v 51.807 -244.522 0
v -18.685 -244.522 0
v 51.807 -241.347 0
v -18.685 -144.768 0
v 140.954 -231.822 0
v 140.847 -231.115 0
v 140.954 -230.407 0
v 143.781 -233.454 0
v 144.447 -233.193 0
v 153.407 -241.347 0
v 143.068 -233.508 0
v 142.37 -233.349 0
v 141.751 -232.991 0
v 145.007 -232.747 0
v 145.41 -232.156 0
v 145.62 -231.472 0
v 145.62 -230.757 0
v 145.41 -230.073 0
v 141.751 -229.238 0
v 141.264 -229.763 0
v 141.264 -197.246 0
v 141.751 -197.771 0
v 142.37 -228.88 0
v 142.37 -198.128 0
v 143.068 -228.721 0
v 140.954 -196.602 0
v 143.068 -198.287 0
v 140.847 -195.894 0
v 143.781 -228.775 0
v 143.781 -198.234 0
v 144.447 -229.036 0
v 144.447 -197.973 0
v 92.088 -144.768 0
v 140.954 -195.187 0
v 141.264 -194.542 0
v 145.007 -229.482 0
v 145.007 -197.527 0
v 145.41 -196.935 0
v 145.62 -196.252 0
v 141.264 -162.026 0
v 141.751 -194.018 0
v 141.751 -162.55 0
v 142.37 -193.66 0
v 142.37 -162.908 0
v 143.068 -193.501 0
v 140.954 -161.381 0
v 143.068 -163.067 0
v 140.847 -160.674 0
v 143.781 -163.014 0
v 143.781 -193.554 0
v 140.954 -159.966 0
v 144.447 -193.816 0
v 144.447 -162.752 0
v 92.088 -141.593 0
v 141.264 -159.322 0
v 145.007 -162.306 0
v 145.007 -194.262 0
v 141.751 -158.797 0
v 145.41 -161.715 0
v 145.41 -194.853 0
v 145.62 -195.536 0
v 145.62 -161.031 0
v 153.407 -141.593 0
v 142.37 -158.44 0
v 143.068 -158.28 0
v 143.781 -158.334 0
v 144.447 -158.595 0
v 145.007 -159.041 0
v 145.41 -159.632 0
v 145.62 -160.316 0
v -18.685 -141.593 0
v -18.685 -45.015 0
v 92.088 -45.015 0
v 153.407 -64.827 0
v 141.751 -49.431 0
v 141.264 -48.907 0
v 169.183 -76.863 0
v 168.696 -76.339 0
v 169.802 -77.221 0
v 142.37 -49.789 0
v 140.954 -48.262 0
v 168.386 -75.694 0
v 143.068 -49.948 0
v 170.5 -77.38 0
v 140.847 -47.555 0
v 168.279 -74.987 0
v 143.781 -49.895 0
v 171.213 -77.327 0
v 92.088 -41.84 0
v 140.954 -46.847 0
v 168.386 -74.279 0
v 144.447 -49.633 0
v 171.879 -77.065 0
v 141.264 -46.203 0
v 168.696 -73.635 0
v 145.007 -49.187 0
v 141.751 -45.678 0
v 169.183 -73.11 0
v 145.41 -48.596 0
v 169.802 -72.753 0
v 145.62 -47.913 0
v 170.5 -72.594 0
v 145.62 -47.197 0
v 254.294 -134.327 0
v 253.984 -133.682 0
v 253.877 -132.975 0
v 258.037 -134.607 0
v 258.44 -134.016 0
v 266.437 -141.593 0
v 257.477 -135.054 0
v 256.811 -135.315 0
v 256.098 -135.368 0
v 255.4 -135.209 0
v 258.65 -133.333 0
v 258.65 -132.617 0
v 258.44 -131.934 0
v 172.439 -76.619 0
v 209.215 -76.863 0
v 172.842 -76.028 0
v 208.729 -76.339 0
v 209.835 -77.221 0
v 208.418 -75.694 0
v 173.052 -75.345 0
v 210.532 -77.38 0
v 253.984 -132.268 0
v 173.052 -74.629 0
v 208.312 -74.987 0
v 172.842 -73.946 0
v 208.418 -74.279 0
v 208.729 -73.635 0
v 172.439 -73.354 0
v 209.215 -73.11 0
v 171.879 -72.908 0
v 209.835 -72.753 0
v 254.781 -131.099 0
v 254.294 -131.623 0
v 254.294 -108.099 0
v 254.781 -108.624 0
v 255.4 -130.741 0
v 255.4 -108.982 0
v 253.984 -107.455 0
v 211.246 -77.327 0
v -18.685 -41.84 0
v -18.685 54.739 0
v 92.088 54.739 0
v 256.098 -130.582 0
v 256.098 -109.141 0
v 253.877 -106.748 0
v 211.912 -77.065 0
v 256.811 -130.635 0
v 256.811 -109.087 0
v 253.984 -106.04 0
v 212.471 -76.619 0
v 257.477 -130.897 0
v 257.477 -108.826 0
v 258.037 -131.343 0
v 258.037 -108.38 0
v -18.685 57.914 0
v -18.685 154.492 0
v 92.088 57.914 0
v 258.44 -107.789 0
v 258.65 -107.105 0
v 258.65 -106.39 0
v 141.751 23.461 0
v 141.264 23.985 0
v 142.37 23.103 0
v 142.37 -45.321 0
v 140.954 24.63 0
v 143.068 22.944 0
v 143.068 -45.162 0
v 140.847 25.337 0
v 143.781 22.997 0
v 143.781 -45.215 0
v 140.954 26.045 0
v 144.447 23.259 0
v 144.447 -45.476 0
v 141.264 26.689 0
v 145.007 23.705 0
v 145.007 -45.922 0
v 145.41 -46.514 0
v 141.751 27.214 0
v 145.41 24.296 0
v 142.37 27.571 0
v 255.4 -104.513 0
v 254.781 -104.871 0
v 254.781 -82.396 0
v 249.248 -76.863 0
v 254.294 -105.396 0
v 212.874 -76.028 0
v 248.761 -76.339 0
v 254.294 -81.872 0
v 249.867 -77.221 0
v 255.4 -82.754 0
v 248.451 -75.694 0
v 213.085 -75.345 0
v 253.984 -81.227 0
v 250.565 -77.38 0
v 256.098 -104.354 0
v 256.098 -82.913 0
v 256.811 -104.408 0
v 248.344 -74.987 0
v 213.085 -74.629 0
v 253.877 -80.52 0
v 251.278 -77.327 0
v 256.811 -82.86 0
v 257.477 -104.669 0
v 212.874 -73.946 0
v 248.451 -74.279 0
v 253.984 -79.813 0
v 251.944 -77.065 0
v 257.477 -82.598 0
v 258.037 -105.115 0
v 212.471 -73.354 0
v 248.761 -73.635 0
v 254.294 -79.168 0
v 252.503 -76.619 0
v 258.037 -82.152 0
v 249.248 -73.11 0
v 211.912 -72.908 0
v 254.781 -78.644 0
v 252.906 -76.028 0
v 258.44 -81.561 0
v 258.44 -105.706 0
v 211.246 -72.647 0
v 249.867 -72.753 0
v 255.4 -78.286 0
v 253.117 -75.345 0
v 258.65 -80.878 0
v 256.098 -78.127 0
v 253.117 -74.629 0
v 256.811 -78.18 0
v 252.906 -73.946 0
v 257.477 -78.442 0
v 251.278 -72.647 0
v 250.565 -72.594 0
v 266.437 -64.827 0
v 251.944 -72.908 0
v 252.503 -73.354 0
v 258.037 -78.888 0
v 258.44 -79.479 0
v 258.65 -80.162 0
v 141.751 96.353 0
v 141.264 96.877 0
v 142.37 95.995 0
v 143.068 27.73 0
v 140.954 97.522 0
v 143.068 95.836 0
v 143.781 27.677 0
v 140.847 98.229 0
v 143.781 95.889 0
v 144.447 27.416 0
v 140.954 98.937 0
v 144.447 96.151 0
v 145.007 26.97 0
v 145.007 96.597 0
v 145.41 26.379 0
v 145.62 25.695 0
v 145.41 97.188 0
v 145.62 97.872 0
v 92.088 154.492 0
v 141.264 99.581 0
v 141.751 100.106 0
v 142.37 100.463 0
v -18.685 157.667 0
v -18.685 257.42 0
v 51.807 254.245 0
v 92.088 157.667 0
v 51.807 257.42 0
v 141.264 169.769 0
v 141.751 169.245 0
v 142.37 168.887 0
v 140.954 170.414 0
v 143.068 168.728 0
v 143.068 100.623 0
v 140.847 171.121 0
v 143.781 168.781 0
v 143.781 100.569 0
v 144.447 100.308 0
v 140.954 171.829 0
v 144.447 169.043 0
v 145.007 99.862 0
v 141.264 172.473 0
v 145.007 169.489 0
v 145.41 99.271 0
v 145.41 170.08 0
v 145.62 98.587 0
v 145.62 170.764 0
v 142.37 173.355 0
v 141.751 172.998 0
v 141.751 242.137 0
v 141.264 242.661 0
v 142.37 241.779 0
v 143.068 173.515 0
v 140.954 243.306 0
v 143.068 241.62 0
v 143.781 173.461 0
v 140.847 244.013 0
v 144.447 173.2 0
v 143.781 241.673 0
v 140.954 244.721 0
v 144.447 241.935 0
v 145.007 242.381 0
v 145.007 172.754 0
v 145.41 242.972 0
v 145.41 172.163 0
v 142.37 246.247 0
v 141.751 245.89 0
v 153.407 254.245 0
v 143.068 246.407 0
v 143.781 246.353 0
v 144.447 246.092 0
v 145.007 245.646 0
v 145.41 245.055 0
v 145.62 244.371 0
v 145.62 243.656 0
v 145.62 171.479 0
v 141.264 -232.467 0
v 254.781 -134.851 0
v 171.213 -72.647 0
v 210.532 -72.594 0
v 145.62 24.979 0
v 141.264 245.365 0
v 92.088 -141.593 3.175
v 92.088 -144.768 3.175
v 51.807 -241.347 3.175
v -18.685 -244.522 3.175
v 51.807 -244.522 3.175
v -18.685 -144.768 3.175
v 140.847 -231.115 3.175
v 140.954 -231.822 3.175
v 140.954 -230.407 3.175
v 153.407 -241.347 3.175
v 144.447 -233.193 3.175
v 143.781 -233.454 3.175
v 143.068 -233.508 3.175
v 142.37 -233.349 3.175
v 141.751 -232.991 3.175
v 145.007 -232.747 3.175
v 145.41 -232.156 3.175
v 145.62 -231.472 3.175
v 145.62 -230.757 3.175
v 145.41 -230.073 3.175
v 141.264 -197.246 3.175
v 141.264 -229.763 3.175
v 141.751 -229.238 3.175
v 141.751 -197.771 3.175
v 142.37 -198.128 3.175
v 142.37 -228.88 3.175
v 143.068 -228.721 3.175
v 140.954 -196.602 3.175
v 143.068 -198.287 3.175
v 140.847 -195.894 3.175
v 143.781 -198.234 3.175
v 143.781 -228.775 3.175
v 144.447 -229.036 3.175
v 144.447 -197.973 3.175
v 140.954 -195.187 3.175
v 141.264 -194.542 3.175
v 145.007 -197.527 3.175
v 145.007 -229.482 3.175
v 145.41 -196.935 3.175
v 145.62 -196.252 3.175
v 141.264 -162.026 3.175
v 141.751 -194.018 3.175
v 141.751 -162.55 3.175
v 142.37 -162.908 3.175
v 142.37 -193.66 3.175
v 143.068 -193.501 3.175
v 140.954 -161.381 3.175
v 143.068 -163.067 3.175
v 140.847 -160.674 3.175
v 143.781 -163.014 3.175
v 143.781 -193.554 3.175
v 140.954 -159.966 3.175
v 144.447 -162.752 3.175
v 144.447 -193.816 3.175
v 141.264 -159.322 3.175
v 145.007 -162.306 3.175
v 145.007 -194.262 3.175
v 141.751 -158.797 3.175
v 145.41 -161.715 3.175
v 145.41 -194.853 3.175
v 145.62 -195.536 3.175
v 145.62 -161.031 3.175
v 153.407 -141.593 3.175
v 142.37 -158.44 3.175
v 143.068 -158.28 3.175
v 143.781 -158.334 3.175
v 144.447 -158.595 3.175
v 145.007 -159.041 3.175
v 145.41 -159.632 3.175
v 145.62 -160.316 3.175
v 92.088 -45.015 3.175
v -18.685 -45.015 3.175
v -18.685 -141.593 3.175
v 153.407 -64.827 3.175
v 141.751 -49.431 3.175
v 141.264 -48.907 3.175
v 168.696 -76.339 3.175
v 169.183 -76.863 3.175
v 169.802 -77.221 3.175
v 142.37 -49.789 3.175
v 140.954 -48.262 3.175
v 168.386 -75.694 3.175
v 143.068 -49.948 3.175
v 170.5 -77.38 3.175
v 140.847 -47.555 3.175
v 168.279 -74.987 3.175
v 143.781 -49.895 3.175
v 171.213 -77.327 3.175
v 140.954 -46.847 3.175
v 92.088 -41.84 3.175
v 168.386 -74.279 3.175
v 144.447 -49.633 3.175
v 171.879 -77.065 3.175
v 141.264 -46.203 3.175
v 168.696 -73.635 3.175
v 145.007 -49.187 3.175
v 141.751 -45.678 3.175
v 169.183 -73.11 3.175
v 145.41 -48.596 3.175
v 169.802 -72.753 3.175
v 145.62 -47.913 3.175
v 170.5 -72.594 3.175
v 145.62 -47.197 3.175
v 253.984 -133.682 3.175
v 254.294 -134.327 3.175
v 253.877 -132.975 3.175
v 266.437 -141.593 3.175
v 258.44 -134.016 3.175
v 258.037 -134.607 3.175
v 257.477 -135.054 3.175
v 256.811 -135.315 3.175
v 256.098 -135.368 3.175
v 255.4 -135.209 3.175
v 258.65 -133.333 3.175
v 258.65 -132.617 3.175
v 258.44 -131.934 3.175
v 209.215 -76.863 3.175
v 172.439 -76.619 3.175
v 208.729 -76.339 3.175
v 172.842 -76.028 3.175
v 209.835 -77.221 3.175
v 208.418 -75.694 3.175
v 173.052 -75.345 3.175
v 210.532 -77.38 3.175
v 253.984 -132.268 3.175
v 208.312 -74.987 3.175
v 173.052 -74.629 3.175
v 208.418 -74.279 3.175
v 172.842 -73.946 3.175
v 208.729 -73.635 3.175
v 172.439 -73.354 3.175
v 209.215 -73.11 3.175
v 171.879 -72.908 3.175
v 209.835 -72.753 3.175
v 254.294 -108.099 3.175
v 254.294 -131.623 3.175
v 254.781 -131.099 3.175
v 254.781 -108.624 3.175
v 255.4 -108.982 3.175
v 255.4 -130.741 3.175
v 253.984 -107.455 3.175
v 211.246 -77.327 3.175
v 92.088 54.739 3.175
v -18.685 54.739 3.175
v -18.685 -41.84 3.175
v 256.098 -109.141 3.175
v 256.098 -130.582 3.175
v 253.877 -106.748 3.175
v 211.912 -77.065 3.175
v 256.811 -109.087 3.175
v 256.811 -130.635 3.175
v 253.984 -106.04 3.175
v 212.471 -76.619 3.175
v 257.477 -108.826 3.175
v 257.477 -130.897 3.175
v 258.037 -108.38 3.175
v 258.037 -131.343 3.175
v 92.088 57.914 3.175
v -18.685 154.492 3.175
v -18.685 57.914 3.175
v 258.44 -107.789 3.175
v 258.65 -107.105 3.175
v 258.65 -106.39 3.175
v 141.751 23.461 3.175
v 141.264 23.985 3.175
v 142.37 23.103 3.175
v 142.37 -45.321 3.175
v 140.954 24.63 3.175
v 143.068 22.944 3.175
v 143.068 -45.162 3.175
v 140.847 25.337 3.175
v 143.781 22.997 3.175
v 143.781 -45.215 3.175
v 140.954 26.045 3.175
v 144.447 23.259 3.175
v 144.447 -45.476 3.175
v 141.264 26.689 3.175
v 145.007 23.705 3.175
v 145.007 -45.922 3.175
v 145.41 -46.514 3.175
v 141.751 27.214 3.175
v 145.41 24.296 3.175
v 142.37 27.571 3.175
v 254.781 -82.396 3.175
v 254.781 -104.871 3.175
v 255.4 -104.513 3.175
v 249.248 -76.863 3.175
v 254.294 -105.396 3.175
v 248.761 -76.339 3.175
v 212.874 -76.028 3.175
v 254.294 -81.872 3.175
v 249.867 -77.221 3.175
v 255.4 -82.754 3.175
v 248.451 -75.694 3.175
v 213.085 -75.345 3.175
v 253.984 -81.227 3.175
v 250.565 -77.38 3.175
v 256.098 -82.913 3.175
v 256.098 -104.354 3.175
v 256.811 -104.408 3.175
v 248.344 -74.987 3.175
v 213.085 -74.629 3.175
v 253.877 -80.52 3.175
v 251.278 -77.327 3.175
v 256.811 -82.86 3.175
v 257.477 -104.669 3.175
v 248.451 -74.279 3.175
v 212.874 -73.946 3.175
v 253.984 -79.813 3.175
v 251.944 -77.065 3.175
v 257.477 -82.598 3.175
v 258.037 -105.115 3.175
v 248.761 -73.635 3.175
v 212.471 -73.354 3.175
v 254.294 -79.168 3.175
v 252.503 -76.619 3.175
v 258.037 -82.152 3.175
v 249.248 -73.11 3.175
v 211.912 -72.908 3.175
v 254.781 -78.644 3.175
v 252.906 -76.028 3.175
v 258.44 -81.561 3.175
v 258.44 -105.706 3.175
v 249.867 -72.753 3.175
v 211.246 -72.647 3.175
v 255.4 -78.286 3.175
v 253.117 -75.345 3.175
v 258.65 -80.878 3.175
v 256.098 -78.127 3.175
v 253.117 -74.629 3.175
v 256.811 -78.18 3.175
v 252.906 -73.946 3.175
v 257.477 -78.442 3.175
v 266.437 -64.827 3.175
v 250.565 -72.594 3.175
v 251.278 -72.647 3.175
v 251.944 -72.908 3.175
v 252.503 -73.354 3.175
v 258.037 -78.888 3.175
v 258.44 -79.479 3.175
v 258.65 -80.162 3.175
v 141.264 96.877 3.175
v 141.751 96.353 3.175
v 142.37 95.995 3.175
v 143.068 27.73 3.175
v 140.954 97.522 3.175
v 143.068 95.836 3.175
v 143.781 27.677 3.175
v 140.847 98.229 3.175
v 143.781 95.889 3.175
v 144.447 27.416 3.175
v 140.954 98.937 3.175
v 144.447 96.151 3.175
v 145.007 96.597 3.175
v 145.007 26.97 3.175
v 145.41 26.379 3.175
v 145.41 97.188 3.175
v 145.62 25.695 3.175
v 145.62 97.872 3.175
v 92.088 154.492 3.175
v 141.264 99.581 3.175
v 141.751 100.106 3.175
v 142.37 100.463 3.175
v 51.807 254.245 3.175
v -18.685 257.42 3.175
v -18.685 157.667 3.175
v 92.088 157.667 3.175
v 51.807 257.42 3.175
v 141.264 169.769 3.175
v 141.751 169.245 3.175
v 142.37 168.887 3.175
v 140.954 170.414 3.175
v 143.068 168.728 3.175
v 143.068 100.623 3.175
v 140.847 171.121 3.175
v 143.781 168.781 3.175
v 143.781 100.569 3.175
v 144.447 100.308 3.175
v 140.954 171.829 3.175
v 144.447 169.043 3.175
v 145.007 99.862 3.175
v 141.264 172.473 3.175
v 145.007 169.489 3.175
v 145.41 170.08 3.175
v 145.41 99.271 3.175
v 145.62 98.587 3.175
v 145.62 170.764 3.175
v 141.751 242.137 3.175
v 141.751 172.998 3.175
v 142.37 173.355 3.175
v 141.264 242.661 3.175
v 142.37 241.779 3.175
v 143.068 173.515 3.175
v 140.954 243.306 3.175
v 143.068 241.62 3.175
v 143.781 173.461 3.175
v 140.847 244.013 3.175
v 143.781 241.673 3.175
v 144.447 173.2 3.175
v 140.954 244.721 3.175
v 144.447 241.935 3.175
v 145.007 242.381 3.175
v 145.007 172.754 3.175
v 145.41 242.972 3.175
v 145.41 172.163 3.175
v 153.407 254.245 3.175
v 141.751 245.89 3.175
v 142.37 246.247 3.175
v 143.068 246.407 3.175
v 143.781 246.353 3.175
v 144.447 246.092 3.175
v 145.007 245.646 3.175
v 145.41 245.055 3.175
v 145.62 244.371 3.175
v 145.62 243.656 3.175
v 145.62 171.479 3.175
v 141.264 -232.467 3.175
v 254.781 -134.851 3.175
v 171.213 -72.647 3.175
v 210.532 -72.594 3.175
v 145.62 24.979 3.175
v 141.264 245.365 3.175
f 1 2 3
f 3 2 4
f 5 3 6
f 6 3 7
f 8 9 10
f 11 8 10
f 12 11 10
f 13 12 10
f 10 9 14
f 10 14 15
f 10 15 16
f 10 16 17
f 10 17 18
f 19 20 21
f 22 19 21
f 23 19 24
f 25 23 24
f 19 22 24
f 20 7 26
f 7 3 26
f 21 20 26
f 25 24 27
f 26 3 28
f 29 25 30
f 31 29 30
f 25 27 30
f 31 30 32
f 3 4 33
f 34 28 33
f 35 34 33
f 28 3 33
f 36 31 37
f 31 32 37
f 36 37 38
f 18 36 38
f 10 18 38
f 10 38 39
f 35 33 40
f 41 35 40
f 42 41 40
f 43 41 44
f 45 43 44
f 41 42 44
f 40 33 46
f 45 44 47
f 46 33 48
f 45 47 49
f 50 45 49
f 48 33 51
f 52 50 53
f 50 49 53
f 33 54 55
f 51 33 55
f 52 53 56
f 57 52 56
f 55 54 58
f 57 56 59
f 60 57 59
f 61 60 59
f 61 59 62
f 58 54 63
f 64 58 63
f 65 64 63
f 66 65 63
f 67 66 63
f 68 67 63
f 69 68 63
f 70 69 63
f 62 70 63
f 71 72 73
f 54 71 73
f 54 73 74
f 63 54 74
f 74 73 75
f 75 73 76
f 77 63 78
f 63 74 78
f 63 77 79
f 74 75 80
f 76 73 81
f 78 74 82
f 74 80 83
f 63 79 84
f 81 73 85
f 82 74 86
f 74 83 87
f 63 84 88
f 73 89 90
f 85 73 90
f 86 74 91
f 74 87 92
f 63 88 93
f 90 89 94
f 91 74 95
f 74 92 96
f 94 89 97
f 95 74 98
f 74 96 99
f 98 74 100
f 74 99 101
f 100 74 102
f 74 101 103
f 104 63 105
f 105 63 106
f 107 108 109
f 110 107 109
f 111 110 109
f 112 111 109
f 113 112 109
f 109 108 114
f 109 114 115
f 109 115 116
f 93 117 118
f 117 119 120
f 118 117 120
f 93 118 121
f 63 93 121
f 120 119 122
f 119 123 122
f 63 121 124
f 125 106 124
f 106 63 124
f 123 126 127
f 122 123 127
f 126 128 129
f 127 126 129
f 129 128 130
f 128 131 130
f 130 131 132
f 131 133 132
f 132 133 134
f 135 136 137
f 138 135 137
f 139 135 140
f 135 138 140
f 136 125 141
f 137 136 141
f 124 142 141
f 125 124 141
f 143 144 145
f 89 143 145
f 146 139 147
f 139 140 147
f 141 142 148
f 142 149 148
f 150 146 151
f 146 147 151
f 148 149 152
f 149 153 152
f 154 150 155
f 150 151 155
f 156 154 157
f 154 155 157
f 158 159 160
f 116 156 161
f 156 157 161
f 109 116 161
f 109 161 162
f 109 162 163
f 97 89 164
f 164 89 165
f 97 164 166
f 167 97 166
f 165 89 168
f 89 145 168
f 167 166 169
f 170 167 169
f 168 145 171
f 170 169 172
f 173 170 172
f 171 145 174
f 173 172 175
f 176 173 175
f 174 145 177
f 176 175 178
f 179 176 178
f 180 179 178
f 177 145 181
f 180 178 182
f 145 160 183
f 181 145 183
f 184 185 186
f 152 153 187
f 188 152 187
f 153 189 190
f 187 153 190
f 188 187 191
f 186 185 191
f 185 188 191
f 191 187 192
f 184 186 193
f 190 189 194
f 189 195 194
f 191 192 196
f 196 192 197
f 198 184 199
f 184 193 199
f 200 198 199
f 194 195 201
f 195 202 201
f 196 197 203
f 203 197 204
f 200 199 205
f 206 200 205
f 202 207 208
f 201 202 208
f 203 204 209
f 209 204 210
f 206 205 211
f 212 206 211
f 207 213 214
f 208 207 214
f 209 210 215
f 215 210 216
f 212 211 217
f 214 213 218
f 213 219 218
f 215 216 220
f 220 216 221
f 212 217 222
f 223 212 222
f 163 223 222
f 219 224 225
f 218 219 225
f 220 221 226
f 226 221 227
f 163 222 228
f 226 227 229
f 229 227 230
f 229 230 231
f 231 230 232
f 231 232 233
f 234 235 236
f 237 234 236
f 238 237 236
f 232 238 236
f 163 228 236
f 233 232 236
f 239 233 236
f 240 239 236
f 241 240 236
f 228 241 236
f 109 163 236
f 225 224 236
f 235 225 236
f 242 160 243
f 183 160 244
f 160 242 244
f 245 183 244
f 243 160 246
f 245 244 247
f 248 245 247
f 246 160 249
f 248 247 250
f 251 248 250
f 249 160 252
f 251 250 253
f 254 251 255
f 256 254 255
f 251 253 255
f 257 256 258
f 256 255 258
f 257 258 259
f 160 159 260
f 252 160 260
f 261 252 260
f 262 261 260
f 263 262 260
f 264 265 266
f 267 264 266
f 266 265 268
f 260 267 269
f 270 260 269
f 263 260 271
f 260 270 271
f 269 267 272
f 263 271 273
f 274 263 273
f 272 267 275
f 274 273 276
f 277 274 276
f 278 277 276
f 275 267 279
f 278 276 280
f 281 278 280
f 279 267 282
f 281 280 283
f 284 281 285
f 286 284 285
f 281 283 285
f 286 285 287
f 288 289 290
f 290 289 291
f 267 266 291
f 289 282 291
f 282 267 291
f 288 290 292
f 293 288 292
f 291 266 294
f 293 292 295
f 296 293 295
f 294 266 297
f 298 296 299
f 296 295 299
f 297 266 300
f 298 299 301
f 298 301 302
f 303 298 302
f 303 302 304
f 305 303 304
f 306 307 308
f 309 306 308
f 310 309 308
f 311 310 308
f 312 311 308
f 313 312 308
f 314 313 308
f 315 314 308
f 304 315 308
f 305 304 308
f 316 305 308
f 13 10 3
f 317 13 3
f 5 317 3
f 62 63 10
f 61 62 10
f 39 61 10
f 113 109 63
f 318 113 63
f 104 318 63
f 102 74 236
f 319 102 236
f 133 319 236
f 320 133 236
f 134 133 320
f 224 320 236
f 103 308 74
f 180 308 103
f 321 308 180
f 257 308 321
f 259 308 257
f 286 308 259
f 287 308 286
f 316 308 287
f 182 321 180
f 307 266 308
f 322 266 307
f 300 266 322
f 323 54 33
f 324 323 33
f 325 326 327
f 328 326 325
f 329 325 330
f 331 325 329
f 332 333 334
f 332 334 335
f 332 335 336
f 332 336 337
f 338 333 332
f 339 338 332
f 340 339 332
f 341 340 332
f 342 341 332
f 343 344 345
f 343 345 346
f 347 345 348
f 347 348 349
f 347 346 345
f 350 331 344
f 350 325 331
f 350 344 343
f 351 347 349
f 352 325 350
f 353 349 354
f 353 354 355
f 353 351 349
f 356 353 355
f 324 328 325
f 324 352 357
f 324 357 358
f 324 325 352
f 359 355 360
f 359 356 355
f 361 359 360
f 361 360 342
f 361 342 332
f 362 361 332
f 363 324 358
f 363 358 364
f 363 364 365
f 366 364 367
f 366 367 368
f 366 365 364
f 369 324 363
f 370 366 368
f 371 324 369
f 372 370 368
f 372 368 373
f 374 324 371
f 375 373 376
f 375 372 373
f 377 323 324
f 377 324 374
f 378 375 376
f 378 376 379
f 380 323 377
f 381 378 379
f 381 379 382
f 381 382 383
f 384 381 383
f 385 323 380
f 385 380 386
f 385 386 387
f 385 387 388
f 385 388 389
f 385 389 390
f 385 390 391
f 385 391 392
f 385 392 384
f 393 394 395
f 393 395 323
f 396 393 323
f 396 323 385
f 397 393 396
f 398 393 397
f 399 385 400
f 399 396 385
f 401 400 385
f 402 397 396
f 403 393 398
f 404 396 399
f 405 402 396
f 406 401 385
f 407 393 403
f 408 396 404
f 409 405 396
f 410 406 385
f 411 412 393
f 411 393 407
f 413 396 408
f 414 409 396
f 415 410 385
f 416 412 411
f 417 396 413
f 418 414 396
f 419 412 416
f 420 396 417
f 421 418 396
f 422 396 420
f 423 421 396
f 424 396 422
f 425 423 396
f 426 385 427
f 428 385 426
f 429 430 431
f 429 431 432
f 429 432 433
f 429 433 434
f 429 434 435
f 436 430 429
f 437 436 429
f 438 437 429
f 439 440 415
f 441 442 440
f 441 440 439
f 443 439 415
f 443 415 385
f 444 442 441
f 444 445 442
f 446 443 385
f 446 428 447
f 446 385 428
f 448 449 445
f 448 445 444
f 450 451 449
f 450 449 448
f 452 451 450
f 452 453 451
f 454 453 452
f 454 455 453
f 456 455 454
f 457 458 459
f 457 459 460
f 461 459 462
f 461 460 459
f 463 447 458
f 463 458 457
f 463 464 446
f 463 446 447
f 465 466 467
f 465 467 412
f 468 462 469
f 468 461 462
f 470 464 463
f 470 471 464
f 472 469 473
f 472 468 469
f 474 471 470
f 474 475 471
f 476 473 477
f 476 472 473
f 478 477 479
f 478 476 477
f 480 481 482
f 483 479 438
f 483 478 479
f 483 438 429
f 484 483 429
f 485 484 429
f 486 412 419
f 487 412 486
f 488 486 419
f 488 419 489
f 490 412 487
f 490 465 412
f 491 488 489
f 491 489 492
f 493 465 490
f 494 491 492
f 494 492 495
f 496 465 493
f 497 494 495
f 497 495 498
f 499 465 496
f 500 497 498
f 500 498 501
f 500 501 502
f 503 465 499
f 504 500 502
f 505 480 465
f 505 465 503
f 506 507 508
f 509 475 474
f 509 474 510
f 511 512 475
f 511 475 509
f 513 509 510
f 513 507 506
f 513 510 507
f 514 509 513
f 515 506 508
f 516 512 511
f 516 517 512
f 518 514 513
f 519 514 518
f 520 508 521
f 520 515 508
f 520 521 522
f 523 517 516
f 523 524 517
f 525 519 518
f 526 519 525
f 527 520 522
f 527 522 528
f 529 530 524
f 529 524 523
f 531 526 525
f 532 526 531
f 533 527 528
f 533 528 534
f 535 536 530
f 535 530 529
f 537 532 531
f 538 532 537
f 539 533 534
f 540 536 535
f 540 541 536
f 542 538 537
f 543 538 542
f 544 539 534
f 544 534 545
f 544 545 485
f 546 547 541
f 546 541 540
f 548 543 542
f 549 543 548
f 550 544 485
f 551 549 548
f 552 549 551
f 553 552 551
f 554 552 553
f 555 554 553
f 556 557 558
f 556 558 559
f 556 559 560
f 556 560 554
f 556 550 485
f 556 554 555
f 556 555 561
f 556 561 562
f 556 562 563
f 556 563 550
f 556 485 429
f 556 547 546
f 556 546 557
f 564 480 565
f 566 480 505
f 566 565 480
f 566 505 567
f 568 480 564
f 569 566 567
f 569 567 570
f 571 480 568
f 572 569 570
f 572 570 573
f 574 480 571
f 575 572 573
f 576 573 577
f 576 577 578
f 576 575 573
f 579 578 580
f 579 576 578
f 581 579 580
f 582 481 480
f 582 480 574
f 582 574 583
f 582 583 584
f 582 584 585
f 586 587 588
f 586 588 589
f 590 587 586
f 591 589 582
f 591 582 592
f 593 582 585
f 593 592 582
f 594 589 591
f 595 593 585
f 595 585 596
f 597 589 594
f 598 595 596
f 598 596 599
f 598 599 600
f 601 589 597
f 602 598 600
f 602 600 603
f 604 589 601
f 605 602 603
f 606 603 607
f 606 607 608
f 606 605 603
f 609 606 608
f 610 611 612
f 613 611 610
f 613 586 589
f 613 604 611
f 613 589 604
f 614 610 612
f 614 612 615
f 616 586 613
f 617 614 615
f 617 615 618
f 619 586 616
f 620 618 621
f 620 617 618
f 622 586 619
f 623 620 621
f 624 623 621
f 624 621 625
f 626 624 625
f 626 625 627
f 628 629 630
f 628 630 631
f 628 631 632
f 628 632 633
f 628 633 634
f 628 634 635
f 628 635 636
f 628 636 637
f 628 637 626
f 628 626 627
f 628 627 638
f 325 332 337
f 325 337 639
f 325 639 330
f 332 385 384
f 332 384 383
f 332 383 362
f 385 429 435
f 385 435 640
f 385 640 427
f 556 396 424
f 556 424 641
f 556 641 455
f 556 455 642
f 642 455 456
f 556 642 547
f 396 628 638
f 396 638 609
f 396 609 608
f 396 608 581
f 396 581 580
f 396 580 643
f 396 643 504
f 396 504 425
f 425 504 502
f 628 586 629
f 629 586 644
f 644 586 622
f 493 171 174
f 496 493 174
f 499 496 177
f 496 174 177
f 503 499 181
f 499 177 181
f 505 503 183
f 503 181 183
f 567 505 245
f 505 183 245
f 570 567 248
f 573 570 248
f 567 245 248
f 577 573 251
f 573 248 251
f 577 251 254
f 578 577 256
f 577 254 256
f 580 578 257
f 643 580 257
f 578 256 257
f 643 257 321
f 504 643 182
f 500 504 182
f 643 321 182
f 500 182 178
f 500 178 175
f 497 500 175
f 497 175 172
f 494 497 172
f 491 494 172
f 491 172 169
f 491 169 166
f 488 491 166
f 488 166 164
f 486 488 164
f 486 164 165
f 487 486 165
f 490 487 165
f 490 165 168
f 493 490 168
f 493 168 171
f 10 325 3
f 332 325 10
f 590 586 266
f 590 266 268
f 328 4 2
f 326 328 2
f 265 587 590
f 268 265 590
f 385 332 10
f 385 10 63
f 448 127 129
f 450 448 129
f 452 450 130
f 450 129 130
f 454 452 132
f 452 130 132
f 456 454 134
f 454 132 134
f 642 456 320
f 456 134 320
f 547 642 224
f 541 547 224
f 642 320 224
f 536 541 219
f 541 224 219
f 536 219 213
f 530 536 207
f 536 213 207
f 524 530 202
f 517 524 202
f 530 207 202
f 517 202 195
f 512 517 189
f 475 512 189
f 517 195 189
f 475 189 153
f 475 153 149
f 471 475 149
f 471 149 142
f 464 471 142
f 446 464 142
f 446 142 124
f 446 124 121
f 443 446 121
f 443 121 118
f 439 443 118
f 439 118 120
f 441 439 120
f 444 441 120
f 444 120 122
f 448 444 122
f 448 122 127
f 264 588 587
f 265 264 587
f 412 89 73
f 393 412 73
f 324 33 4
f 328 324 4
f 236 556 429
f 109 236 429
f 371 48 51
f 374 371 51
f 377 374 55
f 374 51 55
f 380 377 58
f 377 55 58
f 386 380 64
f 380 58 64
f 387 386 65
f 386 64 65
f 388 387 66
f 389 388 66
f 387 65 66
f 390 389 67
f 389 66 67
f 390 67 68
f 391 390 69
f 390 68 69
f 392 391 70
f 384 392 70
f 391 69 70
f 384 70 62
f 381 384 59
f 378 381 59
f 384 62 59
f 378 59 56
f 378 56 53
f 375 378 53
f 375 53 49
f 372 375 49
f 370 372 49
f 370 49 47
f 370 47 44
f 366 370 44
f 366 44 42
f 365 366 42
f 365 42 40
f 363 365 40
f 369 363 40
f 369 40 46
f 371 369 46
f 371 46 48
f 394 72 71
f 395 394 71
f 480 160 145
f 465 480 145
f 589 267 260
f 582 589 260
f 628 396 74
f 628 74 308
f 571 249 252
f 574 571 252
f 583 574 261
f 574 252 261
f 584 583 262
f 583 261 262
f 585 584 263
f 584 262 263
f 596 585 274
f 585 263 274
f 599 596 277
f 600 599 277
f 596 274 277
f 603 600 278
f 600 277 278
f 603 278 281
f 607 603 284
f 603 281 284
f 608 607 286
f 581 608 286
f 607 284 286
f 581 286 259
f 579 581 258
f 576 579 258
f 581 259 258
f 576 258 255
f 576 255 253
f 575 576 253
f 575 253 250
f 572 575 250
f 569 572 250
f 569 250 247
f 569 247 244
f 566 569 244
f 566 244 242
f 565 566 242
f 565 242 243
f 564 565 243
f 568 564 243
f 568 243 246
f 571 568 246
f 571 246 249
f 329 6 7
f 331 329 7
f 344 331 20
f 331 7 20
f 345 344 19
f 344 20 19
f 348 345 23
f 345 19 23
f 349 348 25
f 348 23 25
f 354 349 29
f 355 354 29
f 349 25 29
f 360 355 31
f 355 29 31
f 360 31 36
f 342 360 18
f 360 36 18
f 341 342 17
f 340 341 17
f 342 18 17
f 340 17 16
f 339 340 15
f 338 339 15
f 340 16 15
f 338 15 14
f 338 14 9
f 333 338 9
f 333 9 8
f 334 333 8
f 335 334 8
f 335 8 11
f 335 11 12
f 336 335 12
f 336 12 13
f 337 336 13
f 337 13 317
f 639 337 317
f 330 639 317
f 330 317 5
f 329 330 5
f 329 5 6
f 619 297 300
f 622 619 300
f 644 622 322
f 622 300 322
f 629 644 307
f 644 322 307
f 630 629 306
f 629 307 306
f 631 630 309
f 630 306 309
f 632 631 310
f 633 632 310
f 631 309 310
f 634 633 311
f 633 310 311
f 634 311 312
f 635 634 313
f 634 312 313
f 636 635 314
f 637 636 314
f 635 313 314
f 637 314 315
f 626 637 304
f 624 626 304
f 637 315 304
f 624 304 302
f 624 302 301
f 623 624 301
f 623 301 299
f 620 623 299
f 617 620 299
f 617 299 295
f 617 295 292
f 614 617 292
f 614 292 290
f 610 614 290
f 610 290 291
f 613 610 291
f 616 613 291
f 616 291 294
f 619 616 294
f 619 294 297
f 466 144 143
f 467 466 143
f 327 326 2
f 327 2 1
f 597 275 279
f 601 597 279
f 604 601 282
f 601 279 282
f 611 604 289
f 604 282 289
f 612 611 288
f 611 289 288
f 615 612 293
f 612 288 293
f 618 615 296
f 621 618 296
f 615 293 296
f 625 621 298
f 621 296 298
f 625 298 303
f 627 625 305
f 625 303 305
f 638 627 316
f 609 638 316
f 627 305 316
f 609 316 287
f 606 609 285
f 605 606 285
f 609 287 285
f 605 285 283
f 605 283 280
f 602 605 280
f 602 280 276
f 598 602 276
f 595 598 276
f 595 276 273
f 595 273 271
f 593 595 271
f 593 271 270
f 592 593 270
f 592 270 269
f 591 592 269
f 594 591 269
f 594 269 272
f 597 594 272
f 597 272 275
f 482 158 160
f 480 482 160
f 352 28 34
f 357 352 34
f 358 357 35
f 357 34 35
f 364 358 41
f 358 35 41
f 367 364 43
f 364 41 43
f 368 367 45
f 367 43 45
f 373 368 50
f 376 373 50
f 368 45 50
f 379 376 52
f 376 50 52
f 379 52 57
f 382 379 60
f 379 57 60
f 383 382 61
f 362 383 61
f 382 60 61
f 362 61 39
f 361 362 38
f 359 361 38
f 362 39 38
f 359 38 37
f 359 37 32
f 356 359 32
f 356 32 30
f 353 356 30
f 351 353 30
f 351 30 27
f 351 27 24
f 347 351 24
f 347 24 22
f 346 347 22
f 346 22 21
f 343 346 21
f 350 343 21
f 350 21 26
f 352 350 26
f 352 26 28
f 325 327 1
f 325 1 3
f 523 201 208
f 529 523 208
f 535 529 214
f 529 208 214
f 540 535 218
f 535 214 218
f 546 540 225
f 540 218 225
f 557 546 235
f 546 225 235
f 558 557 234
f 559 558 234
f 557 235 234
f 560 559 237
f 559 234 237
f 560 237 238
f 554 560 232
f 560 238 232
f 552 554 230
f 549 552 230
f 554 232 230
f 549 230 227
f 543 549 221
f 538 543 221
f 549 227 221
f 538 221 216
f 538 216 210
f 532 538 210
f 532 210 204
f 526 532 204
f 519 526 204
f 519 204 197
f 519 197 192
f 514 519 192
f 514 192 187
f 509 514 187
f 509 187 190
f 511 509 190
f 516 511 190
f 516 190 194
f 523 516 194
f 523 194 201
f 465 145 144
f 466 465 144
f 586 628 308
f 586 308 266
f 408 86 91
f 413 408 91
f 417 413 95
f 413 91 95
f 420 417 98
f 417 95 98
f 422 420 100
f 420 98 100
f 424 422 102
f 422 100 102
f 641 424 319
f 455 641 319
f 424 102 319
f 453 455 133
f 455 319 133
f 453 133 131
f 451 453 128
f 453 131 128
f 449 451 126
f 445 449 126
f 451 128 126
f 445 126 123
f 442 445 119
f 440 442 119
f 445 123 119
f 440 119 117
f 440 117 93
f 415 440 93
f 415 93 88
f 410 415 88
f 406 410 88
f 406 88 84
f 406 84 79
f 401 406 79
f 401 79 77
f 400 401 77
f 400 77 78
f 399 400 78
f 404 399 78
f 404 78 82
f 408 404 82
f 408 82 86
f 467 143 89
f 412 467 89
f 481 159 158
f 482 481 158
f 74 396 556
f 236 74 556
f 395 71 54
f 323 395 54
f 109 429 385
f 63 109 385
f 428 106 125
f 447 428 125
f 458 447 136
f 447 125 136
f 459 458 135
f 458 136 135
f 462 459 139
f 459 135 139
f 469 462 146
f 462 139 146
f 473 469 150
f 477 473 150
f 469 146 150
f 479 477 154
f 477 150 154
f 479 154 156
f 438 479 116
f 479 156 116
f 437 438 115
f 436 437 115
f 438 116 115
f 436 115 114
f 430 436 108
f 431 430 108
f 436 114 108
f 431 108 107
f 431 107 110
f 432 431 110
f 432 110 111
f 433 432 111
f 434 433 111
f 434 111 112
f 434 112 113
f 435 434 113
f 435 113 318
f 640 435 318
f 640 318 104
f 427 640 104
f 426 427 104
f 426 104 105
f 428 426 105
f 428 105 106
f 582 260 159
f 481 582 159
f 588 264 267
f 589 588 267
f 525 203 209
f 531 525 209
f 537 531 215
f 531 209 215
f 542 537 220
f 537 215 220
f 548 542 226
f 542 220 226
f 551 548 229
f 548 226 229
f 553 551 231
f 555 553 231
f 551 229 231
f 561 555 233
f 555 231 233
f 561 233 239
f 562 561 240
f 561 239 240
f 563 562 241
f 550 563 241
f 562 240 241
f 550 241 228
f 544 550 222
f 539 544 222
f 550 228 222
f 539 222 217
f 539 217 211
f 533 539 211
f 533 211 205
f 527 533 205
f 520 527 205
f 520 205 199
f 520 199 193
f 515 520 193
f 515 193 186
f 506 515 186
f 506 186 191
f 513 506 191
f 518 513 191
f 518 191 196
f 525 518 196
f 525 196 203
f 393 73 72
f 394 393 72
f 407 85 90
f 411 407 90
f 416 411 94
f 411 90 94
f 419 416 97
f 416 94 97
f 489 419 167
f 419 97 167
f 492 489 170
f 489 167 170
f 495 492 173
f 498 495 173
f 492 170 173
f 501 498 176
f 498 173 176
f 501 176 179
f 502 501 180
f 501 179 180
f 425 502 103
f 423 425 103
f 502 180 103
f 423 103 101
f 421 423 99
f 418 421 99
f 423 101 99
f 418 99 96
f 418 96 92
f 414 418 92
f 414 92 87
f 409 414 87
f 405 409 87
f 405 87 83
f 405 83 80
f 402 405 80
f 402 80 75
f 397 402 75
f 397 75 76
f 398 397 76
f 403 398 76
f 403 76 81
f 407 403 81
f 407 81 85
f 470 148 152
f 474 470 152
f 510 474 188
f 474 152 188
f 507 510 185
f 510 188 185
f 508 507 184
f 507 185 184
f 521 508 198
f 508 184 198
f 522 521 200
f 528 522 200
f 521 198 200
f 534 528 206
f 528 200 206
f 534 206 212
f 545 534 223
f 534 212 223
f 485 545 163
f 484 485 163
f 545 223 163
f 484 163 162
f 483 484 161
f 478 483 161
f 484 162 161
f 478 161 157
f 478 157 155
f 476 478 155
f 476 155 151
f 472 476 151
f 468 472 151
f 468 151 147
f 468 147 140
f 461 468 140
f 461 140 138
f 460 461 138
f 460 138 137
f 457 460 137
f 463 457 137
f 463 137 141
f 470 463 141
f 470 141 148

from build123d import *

# Parameters (mm, degrees)
BOSS_EXTRUDE2_DEPTH  = 3.175
BOSS_EXTRUDE3_DEPTH  = 3.175
BOSS_EXTRUDE6_DEPTH  = 3.175
SKETCH8_W            = 70.49262
SKETCH8_H            = 3.175
BOSS_EXTRUDE7_DEPTH  = 3.175
M4_CLEARANCE_HOLE2_D = 4.8


with BuildPart() as part:
    # Sketch1 → Boss-Extrude2 (new body)
    with BuildSketch(Plane.XY):
        Polygon((129.013076168, 254.245404572), (-18.685383832, 254.245404572), (-18.685383832, 157.666984572), (92.088461168, 157.666984572), (92.088461168, 154.491984572), (-18.685383832, 154.491984572), (-18.685383832, 57.913564572), (92.088461168, 57.913564572), (92.088461168, 54.738564572), (-18.685383832, 54.738564572), (-18.685383832, -41.839855428), (92.088461168, -41.839855428), (92.088461168, -45.014855428), (-18.685383832, -45.014855428), (-18.685383832, -141.593275428), (92.088461168, -141.593275428), (92.088461168, -144.768275428), (-18.685383832, -144.768275428), (-18.685383832, -241.346695428), (129.013076168, -241.346695428), align=None)
    extrude(amount=BOSS_EXTRUDE2_DEPTH)

    # Sketch2 → Boss-Extrude3 (add, through all)
    with BuildSketch(Plane.XY.offset(3.175)):
        Polygon((129.013076168, 254.245404572), (129.013076168, -241.346695428), (153.407236168, -241.346695428), (153.407236168, -227.262720585), (153.407236168, -187.892720585), (153.407236168, -143.180775428), (153.407236168, 240.16142973), (153.407236168, 254.245404572), align=None)
    extrude(amount=-BOSS_EXTRUDE3_DEPTH)

    # Sketch7 → Boss-Extrude6 (add, through all)
    with BuildSketch(Plane.XY.offset(3.175)):
        Polygon((153.22938521, -141.593275428), (153.407236168, -64.827061449), (266.437236168, -64.827061449), (266.437236168, -141.593275428), align=None)
    extrude(amount=-BOSS_EXTRUDE6_DEPTH)

    # Sketch8 → Boss-Extrude7 (add, through all)
    with BuildSketch(Plane.XY.offset(3.175)):
        with Locations((16.560926168, 255.832904572)):
            Rectangle(SKETCH8_W, SKETCH8_H)
        with Locations((16.560926168, -242.934195428)):
            Rectangle(SKETCH8_W, SKETCH8_H)
    extrude(amount=-BOSS_EXTRUDE7_DEPTH)

    # M4 Clearance Hole2 (through all)
    with Locations(Plane.XY.offset(3.175)):
        with Locations((143.247236168, 244.013297791), (143.247236168, 171.121259486), (143.247236168, 98.229221182), (143.247236168, 25.337182877), (143.247236168, -47.554855428), (170.679236168, -74.986855428), (210.711682777, -74.986855428), (250.744129387, -74.986855428), (256.277236168, -80.519962209), (256.277236168, -106.747508818), (256.277236168, -132.975055428), (143.247236168, -160.673755428), (143.247236168, -195.894172037), (143.247236168, -231.114588646)):
            Hole(M4_CLEARANCE_HOLE2_D / 2)


solid = part.part
